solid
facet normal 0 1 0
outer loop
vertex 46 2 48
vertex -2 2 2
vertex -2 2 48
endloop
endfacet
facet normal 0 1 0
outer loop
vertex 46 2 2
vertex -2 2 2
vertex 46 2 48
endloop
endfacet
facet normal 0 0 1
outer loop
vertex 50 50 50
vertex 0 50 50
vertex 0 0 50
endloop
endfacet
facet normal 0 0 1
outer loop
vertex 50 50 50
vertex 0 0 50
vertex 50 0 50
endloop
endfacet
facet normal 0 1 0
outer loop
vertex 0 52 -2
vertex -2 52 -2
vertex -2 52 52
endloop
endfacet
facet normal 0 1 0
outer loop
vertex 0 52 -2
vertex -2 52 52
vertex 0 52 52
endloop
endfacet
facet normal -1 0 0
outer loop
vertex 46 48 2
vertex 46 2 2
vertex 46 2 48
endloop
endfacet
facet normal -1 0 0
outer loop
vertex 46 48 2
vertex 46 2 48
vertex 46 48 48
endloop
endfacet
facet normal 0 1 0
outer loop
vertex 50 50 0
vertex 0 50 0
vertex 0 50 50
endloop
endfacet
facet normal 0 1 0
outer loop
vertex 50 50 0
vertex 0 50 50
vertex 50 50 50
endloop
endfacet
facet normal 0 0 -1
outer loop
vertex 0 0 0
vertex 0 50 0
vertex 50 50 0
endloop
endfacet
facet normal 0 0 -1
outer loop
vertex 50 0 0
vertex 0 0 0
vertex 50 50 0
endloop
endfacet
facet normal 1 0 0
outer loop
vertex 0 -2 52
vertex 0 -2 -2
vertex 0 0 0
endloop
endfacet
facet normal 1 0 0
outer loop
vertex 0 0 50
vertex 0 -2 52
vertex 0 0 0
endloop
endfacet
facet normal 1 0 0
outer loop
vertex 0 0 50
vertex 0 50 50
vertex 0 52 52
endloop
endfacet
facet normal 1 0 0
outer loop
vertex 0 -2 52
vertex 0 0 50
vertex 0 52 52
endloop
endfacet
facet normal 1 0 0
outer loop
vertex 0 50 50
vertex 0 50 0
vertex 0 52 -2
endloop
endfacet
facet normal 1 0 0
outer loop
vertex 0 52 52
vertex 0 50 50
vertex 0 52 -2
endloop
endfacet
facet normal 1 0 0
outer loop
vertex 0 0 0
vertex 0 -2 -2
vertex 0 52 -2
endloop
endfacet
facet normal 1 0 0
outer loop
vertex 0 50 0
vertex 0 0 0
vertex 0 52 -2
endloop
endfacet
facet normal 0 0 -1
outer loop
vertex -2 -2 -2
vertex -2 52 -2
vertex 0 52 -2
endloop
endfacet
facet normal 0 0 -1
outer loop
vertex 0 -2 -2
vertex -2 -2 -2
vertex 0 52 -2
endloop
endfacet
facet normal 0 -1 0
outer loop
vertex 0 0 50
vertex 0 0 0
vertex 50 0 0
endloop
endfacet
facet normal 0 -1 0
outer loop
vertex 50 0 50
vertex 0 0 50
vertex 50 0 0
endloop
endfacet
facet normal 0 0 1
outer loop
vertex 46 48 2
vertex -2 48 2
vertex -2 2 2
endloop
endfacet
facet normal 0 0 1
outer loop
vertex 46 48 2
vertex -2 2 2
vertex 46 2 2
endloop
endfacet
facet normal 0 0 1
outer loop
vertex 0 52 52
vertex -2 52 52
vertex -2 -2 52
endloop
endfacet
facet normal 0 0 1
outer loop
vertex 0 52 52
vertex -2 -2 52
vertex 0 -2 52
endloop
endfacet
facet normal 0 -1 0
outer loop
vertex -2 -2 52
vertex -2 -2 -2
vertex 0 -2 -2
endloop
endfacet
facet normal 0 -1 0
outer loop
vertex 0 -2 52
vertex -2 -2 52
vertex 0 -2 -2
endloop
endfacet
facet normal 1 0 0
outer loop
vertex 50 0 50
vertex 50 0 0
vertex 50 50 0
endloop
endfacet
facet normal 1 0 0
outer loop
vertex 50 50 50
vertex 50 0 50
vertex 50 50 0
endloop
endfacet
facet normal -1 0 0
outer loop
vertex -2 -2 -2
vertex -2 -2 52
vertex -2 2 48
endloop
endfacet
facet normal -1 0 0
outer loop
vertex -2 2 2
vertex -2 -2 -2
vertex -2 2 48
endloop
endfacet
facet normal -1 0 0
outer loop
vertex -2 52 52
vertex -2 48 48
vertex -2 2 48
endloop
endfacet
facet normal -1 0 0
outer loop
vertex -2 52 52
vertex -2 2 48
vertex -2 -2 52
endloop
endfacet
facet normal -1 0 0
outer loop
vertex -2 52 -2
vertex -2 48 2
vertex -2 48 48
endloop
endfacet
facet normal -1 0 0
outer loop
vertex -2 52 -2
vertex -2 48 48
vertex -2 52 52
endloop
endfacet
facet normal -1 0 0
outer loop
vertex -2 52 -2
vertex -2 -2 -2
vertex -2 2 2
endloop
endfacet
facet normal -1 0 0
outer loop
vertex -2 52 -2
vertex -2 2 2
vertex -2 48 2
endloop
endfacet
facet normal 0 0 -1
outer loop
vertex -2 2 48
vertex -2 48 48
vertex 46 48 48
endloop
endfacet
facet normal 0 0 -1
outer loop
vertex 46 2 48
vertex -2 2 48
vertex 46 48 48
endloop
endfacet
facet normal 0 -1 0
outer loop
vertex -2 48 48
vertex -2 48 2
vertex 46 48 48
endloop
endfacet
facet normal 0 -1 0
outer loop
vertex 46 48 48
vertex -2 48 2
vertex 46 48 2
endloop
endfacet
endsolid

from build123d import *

# Parameters (mm, degrees)
BOX002_W     = 48
BOX002_H     = 46
BOX002_DEPTH = 46
BOX_W        = 50
BOX_H        = 50
BOX_DEPTH    = 50
BOX001_W     = 2
BOX001_H     = 54
BOX001_DEPTH = 54


with BuildPart() as cube002:
    # Box002 → Box002 (new body)
    with BuildSketch(Plane(origin=(-2, 2, 2), x_dir=(1, 0, 0), z_dir=(0, 0, 1))):
        with Locations((24, 23)):
            Rectangle(BOX002_W, BOX002_H)
    extrude(amount=BOX002_DEPTH)


with BuildPart() as cube:
    # Box → Box (new body)
    with BuildSketch(Plane.XY):
        with Locations((25, 25)):
            Rectangle(BOX_W, BOX_H)
    extrude(amount=BOX_DEPTH)


with BuildPart() as cut:
    # Box001 → Box001 (new body)
    with BuildSketch(Plane(origin=(-2, -2, -2), x_dir=(1, 0, 0), z_dir=(0, 0, 1))):
        with Locations((1, 27)):
            Rectangle(BOX001_W, BOX001_H)
    extrude(amount=BOX001_DEPTH)

    # Fusion: union Cube
    add(cube.part)

    # Cut: cut Cube002
    add(cube002.part, mode=Mode.SUBTRACT)


solid = cut.part
